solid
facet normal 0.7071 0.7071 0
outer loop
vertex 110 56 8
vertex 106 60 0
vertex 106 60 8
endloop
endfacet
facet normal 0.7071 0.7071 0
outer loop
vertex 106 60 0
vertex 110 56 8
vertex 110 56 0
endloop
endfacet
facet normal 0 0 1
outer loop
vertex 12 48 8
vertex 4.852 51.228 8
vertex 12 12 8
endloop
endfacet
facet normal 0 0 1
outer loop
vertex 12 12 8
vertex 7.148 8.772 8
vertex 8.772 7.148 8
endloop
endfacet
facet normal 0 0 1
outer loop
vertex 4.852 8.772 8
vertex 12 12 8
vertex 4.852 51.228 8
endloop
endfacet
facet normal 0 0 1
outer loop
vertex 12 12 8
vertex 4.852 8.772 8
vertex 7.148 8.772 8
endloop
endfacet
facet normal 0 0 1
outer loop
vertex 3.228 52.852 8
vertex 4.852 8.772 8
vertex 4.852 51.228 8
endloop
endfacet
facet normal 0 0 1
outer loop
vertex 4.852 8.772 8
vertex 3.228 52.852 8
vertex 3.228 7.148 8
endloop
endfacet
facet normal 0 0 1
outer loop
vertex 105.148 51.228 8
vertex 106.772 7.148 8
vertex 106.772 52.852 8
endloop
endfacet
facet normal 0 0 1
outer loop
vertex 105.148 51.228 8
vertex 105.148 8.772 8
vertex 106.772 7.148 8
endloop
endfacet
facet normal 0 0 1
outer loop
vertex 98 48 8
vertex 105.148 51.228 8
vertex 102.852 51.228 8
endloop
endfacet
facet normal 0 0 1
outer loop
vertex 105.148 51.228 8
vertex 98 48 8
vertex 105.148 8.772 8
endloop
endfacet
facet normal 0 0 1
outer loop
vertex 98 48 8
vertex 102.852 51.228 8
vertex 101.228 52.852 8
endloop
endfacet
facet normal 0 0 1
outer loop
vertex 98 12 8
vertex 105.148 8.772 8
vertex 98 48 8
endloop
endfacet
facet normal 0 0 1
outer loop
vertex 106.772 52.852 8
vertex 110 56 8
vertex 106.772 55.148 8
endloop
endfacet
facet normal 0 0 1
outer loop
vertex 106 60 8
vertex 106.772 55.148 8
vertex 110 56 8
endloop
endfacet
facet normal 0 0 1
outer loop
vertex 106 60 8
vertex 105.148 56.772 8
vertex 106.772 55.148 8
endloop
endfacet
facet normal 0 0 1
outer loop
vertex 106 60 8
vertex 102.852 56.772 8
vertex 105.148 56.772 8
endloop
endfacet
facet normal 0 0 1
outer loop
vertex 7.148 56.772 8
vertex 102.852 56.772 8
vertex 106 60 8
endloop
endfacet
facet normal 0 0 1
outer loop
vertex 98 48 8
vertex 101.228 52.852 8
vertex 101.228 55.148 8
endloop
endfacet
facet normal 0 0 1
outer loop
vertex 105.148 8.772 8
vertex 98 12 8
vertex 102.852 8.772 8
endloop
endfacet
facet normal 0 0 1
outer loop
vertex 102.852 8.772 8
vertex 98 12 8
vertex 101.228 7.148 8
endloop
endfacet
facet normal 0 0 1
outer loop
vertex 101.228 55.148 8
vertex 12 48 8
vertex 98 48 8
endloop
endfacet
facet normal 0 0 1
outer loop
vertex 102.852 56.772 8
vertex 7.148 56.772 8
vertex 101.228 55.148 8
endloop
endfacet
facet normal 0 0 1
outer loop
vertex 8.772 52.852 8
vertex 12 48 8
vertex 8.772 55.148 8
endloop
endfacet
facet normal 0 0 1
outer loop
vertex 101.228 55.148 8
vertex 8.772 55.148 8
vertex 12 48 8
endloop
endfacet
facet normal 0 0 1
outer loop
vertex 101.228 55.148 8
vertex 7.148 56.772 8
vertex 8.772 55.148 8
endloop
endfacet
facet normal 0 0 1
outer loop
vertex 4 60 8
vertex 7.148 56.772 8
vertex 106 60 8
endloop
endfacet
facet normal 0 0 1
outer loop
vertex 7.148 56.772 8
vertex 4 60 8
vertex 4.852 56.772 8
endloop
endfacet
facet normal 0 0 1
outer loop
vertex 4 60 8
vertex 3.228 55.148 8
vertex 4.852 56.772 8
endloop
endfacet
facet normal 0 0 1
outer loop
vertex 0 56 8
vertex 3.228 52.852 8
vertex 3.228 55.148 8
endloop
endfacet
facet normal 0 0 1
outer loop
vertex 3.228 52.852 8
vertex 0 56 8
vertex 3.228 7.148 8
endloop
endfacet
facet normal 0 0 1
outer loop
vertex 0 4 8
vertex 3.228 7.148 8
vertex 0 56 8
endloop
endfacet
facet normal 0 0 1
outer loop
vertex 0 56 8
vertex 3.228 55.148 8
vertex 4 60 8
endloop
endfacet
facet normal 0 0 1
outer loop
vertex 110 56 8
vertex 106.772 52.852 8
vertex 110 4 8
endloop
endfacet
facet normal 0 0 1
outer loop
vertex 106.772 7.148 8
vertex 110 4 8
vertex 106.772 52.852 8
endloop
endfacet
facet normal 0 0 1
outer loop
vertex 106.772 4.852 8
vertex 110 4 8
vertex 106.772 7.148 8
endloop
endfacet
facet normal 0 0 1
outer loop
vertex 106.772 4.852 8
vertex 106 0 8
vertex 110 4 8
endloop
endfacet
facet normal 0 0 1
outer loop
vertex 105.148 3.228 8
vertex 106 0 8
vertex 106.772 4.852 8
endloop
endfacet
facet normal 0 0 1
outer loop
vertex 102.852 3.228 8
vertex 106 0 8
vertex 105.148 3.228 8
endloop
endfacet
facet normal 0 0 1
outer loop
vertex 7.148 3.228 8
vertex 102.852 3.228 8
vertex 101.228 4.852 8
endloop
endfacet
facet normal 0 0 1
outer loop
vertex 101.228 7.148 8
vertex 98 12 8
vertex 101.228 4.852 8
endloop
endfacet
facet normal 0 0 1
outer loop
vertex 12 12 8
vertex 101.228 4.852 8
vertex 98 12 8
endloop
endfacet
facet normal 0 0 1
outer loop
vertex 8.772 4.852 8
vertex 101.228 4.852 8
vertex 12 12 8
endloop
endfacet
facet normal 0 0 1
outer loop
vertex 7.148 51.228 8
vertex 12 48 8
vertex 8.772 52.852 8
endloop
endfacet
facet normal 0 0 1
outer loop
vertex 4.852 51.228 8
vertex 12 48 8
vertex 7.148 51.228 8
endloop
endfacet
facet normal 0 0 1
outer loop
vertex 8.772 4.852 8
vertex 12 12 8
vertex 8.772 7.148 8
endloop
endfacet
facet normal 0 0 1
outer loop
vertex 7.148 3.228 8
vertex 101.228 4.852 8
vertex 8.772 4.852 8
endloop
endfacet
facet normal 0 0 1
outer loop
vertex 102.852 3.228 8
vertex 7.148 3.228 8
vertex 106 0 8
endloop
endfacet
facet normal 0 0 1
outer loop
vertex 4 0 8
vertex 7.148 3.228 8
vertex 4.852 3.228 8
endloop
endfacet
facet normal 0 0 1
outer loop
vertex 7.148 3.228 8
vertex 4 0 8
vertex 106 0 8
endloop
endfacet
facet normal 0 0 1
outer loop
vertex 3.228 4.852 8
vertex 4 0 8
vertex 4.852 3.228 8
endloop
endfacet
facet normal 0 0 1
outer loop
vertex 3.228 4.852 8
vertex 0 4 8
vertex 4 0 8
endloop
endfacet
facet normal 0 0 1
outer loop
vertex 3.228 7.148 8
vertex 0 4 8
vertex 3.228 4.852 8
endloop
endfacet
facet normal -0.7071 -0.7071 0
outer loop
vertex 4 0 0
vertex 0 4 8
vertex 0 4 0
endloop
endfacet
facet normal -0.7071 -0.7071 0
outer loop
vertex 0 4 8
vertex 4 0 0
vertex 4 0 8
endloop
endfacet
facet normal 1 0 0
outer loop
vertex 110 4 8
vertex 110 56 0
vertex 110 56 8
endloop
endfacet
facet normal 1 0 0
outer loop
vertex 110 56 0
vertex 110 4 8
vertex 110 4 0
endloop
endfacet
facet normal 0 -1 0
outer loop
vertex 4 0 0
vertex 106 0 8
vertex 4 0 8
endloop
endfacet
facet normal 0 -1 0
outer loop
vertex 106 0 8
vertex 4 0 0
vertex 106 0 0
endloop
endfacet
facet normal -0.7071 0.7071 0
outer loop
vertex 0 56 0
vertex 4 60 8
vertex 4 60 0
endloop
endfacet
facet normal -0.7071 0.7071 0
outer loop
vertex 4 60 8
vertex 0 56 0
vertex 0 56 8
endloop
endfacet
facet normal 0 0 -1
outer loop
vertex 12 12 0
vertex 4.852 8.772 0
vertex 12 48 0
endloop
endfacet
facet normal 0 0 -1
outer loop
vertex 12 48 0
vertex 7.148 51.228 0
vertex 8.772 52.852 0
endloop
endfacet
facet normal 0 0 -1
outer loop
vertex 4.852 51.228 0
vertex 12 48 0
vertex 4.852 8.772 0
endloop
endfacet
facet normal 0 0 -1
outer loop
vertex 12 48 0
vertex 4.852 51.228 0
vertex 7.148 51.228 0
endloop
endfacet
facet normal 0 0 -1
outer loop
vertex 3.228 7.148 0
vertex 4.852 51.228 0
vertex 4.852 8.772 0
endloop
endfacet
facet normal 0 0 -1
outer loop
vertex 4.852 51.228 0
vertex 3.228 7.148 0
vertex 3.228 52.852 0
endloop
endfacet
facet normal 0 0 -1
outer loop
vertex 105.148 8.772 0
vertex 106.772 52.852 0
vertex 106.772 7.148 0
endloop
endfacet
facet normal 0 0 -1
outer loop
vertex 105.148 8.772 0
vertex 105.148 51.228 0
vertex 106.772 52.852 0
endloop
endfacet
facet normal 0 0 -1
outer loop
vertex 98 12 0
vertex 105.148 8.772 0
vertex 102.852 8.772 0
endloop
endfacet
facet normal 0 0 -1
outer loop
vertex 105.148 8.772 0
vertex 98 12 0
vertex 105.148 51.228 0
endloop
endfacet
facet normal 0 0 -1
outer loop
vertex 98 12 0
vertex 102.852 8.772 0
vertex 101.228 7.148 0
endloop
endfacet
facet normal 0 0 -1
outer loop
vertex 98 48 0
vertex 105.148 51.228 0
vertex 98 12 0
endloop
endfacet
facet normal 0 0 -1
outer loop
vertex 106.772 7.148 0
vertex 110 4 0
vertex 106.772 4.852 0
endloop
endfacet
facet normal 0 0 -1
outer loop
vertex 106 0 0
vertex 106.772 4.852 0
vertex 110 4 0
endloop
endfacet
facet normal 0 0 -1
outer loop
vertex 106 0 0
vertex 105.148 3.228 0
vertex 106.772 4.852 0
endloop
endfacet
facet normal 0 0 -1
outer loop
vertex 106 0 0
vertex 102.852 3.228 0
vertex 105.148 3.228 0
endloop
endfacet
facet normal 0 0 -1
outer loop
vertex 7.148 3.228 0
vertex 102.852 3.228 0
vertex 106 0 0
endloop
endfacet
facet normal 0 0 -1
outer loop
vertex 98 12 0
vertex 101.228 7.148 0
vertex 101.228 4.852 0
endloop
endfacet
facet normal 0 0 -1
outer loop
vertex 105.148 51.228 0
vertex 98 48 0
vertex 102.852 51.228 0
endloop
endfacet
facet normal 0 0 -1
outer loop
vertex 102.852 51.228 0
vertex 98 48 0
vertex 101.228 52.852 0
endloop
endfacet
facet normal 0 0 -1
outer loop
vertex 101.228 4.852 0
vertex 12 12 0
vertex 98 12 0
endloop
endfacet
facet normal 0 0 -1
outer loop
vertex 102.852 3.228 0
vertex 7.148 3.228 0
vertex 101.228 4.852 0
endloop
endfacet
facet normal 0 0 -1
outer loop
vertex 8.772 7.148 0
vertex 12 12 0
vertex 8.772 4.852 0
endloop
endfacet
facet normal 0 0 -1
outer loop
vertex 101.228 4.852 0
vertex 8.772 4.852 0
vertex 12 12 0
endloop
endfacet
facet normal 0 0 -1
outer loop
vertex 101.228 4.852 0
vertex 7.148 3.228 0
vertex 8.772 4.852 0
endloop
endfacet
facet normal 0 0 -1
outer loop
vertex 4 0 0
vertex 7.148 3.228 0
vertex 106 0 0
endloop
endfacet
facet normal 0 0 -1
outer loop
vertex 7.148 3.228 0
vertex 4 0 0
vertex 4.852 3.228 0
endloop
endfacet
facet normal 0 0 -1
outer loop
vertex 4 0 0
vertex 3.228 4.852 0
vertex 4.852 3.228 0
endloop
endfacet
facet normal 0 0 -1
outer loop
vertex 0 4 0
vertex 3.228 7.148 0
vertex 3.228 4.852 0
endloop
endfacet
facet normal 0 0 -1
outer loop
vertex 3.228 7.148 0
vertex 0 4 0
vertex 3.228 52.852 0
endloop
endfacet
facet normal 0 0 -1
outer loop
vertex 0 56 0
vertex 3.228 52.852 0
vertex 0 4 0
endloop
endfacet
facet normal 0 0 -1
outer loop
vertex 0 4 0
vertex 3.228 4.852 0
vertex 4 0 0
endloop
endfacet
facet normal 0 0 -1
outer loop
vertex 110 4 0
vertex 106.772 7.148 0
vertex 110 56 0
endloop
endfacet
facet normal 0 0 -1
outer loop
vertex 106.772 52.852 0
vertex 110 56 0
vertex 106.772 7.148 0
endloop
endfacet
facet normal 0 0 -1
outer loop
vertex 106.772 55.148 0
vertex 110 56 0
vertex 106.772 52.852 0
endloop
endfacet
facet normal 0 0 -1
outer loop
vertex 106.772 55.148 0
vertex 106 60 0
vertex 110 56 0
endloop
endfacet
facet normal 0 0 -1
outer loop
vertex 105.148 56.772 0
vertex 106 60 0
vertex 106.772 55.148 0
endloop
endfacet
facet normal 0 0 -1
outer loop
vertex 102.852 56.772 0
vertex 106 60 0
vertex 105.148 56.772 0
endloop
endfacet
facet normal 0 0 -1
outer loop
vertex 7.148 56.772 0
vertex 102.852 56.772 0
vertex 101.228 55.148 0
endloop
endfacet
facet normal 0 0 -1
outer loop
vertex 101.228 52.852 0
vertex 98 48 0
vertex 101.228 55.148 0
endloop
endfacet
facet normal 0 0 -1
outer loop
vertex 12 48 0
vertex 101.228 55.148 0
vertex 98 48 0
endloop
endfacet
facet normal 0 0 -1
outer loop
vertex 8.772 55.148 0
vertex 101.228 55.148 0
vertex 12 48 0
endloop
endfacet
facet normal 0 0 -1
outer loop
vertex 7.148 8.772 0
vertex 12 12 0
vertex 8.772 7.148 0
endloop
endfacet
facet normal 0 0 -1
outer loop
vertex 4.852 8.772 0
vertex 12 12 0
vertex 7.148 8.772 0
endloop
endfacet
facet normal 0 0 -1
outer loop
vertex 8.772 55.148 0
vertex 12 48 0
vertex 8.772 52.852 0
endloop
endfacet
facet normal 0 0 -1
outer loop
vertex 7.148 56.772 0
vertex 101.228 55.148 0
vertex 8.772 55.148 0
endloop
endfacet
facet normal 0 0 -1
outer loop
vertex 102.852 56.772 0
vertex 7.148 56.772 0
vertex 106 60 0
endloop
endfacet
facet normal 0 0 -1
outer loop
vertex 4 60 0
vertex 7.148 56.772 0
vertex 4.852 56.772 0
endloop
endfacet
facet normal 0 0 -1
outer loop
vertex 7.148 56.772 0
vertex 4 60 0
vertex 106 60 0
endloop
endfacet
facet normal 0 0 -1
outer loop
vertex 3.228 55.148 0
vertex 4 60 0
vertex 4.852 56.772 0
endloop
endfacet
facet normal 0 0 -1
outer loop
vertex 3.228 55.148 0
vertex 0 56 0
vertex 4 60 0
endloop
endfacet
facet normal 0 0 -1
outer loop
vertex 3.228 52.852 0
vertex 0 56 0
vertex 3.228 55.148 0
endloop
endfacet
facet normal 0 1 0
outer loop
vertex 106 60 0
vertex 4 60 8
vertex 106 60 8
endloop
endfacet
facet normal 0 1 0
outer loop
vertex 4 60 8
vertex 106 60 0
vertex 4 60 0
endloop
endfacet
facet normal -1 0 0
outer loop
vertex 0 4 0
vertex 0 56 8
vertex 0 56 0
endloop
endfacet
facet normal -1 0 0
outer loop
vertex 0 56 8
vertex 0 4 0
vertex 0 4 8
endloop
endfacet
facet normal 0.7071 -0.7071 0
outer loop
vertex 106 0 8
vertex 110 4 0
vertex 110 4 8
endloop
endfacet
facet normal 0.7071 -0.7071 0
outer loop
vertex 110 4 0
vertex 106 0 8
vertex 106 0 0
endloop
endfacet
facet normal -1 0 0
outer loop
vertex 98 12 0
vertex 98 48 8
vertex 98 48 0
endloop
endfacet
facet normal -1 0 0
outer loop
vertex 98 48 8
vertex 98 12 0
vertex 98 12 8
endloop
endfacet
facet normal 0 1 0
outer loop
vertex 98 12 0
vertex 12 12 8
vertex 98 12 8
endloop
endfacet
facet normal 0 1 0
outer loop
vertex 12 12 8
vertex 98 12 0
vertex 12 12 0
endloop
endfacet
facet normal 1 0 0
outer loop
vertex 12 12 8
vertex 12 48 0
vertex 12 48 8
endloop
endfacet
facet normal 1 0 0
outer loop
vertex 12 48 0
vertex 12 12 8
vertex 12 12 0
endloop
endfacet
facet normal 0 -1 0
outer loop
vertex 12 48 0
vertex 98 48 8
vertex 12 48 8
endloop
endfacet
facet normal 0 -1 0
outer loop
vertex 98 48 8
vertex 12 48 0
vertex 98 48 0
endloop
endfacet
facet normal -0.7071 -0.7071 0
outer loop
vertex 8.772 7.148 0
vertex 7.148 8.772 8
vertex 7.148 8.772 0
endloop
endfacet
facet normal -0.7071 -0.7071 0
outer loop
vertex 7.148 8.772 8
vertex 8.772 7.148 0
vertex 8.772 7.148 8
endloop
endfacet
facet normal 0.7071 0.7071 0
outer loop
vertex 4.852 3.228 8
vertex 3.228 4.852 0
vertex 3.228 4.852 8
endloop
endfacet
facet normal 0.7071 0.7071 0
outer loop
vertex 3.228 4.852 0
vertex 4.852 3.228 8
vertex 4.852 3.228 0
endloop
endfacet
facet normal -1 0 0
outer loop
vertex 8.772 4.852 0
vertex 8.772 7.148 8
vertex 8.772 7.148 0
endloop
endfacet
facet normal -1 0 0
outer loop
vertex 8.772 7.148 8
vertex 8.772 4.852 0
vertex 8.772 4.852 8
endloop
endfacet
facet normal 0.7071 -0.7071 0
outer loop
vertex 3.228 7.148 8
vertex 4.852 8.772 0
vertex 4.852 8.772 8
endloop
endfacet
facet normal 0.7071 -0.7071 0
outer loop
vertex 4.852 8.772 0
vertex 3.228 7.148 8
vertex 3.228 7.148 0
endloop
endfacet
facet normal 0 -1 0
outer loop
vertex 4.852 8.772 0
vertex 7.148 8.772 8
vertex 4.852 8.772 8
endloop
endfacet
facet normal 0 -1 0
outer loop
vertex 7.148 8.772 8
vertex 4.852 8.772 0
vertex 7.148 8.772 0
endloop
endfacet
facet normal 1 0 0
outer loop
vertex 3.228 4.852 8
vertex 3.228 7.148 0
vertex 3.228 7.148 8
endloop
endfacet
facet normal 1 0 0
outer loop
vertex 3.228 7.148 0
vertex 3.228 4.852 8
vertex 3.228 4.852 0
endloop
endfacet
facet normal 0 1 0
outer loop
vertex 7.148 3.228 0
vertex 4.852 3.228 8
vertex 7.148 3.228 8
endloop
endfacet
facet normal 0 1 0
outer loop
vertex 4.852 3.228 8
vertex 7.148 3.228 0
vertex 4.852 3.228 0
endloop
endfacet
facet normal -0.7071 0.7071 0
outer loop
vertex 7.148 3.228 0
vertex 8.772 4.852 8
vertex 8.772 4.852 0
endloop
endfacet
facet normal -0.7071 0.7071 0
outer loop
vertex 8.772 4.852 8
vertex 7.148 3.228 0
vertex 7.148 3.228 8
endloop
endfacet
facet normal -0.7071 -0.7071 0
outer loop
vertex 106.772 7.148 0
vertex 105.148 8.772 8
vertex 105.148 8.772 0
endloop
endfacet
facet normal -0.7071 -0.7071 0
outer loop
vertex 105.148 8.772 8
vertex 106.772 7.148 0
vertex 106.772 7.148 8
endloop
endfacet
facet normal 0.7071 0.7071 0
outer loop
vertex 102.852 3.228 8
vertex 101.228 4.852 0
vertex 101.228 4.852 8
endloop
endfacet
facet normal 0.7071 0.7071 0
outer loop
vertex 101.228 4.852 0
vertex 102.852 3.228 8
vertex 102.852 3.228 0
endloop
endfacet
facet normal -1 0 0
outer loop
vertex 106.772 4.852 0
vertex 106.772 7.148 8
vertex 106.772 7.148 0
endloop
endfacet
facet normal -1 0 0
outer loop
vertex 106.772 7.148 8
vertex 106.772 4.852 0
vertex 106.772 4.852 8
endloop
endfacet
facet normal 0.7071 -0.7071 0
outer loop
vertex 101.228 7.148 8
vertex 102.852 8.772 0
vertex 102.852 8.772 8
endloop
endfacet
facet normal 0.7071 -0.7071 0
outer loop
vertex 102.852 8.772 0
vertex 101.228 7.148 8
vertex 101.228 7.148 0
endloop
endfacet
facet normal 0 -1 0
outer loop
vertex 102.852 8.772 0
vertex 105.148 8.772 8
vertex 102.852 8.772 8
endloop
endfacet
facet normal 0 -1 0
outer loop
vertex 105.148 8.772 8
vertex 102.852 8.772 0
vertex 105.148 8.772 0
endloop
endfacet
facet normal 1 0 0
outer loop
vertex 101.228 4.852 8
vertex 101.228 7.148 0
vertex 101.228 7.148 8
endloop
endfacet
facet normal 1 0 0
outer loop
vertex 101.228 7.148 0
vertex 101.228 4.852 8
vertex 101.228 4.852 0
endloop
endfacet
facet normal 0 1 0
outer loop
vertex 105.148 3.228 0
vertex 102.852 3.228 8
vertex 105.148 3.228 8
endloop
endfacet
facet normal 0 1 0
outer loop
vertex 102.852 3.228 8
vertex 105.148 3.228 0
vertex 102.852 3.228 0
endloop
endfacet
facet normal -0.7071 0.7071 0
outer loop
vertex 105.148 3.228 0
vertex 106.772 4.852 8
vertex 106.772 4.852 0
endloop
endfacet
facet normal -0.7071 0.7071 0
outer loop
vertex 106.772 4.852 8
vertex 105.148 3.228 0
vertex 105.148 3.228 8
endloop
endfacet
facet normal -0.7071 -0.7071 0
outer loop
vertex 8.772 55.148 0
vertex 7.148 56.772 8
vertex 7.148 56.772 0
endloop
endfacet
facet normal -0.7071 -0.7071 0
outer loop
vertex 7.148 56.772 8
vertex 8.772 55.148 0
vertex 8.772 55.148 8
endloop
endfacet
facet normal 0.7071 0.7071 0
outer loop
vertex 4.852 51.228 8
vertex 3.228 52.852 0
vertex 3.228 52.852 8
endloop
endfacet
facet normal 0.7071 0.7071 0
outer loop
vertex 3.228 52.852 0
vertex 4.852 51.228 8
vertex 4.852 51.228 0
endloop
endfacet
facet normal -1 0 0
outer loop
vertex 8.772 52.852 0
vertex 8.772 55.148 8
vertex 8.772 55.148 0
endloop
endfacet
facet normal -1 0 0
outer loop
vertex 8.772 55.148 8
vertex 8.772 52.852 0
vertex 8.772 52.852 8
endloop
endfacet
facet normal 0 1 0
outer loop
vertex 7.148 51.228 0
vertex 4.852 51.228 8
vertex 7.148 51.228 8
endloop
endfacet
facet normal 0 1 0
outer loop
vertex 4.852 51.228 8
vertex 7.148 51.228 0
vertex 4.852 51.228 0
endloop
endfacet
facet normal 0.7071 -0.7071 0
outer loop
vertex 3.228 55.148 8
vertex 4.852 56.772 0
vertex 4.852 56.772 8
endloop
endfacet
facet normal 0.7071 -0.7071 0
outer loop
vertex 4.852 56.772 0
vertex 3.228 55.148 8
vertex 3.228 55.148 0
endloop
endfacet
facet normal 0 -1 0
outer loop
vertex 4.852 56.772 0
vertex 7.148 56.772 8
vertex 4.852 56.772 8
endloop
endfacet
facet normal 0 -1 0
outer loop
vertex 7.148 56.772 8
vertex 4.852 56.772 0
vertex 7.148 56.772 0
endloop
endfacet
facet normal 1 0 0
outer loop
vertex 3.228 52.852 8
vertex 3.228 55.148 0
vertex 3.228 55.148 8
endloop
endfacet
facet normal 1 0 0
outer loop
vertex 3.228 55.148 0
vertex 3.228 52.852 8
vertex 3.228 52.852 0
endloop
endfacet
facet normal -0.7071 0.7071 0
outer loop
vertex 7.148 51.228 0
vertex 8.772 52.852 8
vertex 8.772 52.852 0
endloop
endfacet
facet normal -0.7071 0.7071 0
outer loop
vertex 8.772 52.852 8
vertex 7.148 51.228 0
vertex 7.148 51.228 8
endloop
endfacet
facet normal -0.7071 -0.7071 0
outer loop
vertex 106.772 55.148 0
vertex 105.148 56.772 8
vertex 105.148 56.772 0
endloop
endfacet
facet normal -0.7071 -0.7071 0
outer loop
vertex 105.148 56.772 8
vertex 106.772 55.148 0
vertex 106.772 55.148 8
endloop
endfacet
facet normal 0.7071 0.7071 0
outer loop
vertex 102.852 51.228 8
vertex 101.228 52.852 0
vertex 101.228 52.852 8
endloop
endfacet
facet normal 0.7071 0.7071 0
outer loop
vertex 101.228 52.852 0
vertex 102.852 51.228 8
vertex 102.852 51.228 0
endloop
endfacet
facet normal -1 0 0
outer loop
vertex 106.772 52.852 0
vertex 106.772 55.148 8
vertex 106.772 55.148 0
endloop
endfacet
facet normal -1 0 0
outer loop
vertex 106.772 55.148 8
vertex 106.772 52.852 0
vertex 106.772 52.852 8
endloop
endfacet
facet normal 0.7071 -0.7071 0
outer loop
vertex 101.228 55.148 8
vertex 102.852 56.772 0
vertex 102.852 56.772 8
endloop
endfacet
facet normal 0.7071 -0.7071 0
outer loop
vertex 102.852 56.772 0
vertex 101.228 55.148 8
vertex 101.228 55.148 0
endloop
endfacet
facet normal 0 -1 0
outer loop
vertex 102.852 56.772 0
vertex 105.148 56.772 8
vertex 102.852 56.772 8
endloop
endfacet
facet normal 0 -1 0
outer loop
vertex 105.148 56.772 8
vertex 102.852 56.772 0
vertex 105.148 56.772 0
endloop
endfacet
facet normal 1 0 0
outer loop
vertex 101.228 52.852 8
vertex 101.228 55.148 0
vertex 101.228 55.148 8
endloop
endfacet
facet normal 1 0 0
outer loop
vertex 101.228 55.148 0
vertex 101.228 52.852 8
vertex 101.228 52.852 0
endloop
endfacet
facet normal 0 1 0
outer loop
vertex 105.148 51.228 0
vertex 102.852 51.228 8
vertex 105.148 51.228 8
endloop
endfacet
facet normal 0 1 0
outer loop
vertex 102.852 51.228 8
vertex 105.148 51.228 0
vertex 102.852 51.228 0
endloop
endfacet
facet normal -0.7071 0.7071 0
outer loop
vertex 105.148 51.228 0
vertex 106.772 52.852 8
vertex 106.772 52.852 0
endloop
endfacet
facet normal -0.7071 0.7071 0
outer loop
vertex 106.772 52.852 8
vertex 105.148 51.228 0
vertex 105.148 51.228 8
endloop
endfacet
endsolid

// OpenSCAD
$fn = 32;

// ----------------------------------------------------------------------
// Frame plate: 110 x 60 frame, 12 mm rails
// ----------------------------------------------------------------------

// --- parameters (mm) ---
plate_l = 110;            // plate length, X
plate_w = 60;             // plate width, Y
plate_t = 8;              // plate thickness, Z (extrusion height)
corner_c = 4;             // corner chamfer
frame_bar = 12;           // frame rail width
bolt_r = 3;               // corner bolt window radius
bolt_inset = 6;           // bolt centre inset from the edges

win_l = plate_l - 2 * frame_bar;  // window length
win_w = plate_w - 2 * frame_bar;  // window width
bolt_d = 2 * bolt_r;  // corner hole diameter

profile = [[4, 0], [106, 0], [110, 4], [110, 56], [106, 60], [4, 60], [0, 56], [0, 4]];  // primary outline, 8 points, counter clockwise
void_1 = [[12, 12], [98, 12], [98, 48], [12, 48]];  // the window, 4 points
void_2 = [[8.772, 7.148], [7.148, 8.772], [4.852, 8.772], [3.228, 7.148], [3.228, 4.852], [4.852, 3.228], [7.148, 3.228], [8.772, 4.852]];  // corner bolt window, 8 points
void_3 = [[106.772, 7.148], [105.148, 8.772], [102.852, 8.772], [101.228, 7.148], [101.228, 4.852], [102.852, 3.228], [105.148, 3.228], [106.772, 4.852]];  // corner bolt window, 8 points
void_4 = [[8.772, 55.148], [7.148, 56.772], [4.852, 56.772], [3.228, 55.148], [3.228, 52.852], [4.852, 51.228], [7.148, 51.228], [8.772, 52.852]];  // corner bolt window, 8 points
void_5 = [[106.772, 55.148], [105.148, 56.772], [102.852, 56.772], [101.228, 55.148], [101.228, 52.852], [102.852, 51.228], [105.148, 51.228], [106.772, 52.852]];  // corner bolt window, 8 points

// --- the one profile operation ---
difference() {
  linear_extrude(height = plate_t) polygon(points = profile);
  translate([0, 0, -1])
    linear_extrude(height = plate_t + 2) polygon(points = void_1);
  translate([0, 0, -1])
    linear_extrude(height = plate_t + 2) polygon(points = void_2);
  translate([0, 0, -1])
    linear_extrude(height = plate_t + 2) polygon(points = void_3);
  translate([0, 0, -1])
    linear_extrude(height = plate_t + 2) polygon(points = void_4);
  translate([0, 0, -1])
    linear_extrude(height = plate_t + 2) polygon(points = void_5);
}
